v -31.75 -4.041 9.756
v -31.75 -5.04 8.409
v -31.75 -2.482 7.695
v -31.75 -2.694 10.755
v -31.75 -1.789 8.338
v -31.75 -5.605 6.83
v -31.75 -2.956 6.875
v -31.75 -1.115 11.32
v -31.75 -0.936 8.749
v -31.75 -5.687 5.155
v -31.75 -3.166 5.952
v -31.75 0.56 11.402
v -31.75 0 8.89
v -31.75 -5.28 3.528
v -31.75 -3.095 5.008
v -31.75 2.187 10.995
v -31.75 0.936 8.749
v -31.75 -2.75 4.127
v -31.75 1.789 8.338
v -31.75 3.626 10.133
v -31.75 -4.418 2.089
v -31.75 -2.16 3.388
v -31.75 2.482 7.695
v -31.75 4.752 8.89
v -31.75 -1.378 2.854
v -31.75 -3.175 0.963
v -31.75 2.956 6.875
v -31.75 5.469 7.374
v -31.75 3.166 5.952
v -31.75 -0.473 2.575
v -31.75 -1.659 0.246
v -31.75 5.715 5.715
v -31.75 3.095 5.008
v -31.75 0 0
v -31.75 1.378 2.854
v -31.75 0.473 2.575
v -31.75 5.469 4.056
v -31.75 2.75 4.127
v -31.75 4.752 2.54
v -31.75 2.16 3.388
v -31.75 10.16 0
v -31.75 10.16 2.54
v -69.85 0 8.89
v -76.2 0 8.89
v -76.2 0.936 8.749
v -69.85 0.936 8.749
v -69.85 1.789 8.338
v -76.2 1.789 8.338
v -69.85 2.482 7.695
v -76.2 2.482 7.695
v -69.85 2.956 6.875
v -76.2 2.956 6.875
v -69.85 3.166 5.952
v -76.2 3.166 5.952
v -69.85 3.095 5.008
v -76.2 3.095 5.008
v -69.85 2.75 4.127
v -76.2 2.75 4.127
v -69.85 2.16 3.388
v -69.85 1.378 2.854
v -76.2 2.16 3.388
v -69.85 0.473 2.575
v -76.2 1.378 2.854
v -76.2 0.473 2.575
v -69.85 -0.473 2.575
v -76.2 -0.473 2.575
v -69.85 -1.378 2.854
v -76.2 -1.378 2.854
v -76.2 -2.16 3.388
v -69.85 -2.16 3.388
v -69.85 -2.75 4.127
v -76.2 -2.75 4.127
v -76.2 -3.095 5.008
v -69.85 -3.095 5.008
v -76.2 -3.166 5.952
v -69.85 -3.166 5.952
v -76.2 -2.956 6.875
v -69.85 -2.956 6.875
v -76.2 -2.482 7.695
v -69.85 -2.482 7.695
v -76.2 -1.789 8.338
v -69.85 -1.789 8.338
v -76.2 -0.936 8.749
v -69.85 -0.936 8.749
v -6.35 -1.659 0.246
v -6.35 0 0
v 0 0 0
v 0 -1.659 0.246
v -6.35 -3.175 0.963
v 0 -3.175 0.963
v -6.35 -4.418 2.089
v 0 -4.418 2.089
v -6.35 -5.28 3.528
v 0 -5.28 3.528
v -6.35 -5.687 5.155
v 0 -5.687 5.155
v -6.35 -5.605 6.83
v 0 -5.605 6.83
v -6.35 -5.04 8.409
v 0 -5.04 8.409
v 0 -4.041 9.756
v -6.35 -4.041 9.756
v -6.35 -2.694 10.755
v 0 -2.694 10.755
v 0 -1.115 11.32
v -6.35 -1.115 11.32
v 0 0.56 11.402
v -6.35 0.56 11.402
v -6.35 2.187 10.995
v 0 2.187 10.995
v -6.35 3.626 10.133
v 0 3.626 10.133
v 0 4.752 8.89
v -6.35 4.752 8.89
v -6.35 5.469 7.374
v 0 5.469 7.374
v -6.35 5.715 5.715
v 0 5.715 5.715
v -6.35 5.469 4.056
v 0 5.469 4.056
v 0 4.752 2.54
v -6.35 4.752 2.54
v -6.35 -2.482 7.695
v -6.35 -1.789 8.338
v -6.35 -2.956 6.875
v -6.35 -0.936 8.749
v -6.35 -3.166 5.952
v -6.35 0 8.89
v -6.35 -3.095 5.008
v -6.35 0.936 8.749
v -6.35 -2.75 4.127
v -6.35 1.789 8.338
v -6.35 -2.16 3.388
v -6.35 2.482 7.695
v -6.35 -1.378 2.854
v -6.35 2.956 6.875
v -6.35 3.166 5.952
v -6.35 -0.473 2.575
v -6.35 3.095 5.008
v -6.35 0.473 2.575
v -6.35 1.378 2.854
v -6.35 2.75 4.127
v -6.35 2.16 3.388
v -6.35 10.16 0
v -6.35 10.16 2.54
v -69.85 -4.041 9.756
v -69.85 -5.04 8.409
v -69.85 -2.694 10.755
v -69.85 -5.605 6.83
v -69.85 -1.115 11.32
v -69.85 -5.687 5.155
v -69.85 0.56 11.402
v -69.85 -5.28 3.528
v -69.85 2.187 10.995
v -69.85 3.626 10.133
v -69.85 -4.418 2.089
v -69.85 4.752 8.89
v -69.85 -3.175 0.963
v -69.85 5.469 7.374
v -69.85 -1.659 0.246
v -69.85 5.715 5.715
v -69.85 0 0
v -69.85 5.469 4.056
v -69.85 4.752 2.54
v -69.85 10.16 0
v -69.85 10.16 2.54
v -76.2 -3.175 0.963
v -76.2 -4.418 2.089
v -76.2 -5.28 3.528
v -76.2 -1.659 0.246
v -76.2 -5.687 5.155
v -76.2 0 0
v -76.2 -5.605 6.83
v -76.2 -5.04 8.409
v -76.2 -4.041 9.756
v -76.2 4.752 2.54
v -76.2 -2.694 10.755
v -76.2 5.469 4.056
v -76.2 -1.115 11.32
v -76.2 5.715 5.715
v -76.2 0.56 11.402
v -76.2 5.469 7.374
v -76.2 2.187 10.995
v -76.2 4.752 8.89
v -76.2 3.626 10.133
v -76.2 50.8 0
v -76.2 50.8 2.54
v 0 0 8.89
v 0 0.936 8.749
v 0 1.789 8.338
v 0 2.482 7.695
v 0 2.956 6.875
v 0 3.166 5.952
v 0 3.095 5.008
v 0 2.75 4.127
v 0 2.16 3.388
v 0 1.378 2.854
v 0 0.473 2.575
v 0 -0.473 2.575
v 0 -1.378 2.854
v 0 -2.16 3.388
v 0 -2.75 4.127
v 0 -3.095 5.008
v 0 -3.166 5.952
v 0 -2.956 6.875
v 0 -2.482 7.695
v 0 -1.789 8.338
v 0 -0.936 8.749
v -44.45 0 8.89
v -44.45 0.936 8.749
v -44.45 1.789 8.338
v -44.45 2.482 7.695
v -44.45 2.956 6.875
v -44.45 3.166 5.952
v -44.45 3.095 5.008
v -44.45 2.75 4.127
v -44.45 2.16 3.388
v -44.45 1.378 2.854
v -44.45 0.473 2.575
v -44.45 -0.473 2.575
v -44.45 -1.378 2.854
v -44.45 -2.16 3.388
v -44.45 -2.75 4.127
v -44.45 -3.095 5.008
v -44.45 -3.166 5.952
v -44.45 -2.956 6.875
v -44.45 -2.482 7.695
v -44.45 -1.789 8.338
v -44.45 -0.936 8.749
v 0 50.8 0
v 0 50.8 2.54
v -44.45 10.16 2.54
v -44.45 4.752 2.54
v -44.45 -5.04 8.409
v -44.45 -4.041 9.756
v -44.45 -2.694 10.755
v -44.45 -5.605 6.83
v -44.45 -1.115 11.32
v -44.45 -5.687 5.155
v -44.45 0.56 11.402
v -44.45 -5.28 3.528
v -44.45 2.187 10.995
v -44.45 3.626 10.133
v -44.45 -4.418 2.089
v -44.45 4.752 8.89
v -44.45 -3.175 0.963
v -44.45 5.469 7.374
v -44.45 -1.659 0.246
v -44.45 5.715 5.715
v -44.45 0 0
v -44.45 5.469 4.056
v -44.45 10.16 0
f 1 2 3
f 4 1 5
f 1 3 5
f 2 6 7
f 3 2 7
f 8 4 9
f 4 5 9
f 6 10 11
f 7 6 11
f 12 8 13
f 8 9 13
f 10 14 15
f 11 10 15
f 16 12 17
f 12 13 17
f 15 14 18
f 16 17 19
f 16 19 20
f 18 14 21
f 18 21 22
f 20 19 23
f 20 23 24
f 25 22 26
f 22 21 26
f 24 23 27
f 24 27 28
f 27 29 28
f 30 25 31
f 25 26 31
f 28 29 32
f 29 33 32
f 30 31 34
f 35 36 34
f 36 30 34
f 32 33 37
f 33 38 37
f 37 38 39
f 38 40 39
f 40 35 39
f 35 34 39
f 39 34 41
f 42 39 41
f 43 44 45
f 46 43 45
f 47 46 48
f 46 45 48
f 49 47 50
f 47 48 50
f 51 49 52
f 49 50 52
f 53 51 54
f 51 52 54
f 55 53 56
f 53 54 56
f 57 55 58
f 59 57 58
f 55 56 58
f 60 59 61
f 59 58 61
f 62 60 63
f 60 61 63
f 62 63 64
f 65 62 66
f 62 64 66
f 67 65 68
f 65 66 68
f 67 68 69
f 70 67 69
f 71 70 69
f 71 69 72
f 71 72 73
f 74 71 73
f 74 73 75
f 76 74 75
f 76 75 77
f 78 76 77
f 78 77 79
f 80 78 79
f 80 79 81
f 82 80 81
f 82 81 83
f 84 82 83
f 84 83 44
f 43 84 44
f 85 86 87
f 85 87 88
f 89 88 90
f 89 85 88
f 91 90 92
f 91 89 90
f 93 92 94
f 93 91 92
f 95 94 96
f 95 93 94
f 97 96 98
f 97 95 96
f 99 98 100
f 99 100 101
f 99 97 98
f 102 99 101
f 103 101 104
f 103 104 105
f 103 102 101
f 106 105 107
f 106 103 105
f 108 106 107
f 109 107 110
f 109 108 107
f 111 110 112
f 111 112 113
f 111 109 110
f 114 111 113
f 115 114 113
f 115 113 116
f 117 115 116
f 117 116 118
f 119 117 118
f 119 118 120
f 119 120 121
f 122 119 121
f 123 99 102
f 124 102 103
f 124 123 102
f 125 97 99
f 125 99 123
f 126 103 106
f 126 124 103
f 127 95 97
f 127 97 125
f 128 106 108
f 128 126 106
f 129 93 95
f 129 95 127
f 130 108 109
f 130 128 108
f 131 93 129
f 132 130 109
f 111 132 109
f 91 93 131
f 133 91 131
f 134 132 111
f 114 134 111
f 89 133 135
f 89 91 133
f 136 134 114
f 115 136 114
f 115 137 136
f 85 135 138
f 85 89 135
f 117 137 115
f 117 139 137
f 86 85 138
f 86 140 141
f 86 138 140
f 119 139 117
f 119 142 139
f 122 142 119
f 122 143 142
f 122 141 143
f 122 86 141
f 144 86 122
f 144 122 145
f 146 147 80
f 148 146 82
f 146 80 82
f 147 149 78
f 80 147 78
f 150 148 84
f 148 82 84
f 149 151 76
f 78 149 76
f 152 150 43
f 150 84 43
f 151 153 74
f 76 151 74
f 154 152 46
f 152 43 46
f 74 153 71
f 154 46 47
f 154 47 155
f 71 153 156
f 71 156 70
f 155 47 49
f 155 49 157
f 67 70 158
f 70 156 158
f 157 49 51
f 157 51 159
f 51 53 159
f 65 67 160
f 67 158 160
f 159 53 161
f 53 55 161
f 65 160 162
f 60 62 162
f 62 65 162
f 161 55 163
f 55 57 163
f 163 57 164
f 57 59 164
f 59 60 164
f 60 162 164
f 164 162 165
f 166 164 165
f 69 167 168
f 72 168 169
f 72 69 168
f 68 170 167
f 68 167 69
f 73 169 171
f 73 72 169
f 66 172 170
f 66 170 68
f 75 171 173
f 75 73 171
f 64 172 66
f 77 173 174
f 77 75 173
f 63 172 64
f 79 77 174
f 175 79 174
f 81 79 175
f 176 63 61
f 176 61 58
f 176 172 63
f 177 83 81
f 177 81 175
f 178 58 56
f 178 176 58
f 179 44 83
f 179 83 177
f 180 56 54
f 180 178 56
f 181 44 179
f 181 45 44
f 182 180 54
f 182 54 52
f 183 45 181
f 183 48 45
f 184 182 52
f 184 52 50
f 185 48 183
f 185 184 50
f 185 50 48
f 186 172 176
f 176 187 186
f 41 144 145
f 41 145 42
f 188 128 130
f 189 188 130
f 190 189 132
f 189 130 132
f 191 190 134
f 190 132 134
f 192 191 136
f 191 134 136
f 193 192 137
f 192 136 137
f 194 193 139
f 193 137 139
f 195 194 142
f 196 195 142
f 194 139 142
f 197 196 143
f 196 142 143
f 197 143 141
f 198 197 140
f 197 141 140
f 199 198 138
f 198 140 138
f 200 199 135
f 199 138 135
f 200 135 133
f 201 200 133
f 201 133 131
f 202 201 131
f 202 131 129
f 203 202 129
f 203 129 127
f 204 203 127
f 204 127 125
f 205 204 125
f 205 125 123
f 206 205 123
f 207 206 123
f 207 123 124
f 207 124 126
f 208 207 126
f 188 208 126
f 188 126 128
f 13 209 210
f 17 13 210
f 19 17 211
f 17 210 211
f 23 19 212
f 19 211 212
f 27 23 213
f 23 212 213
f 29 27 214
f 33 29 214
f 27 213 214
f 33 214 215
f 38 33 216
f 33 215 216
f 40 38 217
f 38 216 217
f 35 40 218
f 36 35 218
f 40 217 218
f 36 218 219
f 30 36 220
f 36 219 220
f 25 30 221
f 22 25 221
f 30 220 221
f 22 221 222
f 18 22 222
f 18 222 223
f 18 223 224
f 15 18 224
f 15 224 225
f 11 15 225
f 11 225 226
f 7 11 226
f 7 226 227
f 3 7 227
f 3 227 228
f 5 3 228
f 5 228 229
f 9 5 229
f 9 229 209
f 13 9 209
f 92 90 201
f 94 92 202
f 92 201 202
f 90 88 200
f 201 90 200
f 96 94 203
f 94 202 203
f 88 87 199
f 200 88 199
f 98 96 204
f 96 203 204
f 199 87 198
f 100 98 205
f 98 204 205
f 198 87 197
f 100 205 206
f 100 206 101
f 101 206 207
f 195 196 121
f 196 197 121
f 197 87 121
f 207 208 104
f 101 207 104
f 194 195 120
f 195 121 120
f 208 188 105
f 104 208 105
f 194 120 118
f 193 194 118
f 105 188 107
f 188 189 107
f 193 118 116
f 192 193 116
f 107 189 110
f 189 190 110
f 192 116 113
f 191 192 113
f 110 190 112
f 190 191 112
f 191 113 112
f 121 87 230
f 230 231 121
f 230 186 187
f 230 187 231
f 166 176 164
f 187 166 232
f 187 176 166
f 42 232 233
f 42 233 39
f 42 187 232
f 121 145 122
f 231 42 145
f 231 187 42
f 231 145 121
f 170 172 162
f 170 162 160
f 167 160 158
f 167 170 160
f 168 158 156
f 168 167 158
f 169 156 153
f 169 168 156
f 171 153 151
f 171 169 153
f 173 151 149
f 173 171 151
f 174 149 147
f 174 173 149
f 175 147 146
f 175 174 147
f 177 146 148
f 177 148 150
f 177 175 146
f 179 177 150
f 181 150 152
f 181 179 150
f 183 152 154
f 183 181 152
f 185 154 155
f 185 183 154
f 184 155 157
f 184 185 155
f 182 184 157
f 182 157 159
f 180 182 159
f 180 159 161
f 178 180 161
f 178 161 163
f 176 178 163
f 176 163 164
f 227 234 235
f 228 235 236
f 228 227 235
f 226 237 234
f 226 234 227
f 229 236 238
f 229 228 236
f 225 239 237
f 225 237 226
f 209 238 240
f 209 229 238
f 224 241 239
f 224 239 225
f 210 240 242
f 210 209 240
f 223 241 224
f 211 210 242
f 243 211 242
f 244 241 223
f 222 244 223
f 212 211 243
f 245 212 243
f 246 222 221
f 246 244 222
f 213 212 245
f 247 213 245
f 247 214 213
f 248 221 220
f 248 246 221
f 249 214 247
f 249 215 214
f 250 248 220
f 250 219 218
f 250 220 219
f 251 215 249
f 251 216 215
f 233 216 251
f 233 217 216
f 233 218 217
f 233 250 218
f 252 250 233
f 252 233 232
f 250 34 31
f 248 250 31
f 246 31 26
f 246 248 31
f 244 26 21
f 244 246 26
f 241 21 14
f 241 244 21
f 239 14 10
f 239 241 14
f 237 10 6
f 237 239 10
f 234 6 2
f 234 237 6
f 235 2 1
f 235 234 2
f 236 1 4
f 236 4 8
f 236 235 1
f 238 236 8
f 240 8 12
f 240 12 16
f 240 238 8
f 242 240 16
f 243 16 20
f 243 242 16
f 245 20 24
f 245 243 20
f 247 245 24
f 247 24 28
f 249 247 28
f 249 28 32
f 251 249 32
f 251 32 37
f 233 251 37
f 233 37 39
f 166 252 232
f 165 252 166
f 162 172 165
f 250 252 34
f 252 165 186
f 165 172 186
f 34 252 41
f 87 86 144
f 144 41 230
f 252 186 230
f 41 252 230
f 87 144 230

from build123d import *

# Parameters (mm, degrees)
SKETCH1_W           = 76.2
SKETCH1_H           = 50.8
BOSS_EXTRUDE1_DEPTH = 2.54
SKETCH2_R           = 5.715
SKETCH2_R_2         = 3.175
BOSS_EXTRUDE2_DEPTH = 76.2
SKETCH3_W           = 25.4
SKETCH3_H           = 25.4
CUT_EXTRUDE1_DEPTH  = 93.291521279


with BuildPart() as part:
    # Sketch1 → Boss-Extrude1 (new body)
    with BuildSketch(Plane.XY):
        with Locations((-38.1, 25.4)):
            Rectangle(SKETCH1_W, SKETCH1_H)
    extrude(amount=BOSS_EXTRUDE1_DEPTH)

    # Sketch2 → Boss-Extrude2 (add)
    with BuildSketch(Plane.ZY.offset(76.2)):
        with Locations((5.715, 0)):
            Circle(SKETCH2_R)
        with Locations((5.715, 0)):
            Circle(SKETCH2_R_2, mode=Mode.SUBTRACT)
    extrude(amount=-BOSS_EXTRUDE2_DEPTH)

    # Sketch3 → Cut-Extrude1 (cut, through all)
    with BuildSketch(Plane(origin=(0, 0, 0), x_dir=(-1, 0, 0), z_dir=(0, 0, -1))):
        with Locations((19.05, -2.54)):
            Rectangle(SKETCH3_W, SKETCH3_H)
        with Locations((57.15, -2.54)):
            Rectangle(SKETCH3_W, SKETCH3_H)
    extrude(amount=-CUT_EXTRUDE1_DEPTH, mode=Mode.SUBTRACT)


solid = part.part
